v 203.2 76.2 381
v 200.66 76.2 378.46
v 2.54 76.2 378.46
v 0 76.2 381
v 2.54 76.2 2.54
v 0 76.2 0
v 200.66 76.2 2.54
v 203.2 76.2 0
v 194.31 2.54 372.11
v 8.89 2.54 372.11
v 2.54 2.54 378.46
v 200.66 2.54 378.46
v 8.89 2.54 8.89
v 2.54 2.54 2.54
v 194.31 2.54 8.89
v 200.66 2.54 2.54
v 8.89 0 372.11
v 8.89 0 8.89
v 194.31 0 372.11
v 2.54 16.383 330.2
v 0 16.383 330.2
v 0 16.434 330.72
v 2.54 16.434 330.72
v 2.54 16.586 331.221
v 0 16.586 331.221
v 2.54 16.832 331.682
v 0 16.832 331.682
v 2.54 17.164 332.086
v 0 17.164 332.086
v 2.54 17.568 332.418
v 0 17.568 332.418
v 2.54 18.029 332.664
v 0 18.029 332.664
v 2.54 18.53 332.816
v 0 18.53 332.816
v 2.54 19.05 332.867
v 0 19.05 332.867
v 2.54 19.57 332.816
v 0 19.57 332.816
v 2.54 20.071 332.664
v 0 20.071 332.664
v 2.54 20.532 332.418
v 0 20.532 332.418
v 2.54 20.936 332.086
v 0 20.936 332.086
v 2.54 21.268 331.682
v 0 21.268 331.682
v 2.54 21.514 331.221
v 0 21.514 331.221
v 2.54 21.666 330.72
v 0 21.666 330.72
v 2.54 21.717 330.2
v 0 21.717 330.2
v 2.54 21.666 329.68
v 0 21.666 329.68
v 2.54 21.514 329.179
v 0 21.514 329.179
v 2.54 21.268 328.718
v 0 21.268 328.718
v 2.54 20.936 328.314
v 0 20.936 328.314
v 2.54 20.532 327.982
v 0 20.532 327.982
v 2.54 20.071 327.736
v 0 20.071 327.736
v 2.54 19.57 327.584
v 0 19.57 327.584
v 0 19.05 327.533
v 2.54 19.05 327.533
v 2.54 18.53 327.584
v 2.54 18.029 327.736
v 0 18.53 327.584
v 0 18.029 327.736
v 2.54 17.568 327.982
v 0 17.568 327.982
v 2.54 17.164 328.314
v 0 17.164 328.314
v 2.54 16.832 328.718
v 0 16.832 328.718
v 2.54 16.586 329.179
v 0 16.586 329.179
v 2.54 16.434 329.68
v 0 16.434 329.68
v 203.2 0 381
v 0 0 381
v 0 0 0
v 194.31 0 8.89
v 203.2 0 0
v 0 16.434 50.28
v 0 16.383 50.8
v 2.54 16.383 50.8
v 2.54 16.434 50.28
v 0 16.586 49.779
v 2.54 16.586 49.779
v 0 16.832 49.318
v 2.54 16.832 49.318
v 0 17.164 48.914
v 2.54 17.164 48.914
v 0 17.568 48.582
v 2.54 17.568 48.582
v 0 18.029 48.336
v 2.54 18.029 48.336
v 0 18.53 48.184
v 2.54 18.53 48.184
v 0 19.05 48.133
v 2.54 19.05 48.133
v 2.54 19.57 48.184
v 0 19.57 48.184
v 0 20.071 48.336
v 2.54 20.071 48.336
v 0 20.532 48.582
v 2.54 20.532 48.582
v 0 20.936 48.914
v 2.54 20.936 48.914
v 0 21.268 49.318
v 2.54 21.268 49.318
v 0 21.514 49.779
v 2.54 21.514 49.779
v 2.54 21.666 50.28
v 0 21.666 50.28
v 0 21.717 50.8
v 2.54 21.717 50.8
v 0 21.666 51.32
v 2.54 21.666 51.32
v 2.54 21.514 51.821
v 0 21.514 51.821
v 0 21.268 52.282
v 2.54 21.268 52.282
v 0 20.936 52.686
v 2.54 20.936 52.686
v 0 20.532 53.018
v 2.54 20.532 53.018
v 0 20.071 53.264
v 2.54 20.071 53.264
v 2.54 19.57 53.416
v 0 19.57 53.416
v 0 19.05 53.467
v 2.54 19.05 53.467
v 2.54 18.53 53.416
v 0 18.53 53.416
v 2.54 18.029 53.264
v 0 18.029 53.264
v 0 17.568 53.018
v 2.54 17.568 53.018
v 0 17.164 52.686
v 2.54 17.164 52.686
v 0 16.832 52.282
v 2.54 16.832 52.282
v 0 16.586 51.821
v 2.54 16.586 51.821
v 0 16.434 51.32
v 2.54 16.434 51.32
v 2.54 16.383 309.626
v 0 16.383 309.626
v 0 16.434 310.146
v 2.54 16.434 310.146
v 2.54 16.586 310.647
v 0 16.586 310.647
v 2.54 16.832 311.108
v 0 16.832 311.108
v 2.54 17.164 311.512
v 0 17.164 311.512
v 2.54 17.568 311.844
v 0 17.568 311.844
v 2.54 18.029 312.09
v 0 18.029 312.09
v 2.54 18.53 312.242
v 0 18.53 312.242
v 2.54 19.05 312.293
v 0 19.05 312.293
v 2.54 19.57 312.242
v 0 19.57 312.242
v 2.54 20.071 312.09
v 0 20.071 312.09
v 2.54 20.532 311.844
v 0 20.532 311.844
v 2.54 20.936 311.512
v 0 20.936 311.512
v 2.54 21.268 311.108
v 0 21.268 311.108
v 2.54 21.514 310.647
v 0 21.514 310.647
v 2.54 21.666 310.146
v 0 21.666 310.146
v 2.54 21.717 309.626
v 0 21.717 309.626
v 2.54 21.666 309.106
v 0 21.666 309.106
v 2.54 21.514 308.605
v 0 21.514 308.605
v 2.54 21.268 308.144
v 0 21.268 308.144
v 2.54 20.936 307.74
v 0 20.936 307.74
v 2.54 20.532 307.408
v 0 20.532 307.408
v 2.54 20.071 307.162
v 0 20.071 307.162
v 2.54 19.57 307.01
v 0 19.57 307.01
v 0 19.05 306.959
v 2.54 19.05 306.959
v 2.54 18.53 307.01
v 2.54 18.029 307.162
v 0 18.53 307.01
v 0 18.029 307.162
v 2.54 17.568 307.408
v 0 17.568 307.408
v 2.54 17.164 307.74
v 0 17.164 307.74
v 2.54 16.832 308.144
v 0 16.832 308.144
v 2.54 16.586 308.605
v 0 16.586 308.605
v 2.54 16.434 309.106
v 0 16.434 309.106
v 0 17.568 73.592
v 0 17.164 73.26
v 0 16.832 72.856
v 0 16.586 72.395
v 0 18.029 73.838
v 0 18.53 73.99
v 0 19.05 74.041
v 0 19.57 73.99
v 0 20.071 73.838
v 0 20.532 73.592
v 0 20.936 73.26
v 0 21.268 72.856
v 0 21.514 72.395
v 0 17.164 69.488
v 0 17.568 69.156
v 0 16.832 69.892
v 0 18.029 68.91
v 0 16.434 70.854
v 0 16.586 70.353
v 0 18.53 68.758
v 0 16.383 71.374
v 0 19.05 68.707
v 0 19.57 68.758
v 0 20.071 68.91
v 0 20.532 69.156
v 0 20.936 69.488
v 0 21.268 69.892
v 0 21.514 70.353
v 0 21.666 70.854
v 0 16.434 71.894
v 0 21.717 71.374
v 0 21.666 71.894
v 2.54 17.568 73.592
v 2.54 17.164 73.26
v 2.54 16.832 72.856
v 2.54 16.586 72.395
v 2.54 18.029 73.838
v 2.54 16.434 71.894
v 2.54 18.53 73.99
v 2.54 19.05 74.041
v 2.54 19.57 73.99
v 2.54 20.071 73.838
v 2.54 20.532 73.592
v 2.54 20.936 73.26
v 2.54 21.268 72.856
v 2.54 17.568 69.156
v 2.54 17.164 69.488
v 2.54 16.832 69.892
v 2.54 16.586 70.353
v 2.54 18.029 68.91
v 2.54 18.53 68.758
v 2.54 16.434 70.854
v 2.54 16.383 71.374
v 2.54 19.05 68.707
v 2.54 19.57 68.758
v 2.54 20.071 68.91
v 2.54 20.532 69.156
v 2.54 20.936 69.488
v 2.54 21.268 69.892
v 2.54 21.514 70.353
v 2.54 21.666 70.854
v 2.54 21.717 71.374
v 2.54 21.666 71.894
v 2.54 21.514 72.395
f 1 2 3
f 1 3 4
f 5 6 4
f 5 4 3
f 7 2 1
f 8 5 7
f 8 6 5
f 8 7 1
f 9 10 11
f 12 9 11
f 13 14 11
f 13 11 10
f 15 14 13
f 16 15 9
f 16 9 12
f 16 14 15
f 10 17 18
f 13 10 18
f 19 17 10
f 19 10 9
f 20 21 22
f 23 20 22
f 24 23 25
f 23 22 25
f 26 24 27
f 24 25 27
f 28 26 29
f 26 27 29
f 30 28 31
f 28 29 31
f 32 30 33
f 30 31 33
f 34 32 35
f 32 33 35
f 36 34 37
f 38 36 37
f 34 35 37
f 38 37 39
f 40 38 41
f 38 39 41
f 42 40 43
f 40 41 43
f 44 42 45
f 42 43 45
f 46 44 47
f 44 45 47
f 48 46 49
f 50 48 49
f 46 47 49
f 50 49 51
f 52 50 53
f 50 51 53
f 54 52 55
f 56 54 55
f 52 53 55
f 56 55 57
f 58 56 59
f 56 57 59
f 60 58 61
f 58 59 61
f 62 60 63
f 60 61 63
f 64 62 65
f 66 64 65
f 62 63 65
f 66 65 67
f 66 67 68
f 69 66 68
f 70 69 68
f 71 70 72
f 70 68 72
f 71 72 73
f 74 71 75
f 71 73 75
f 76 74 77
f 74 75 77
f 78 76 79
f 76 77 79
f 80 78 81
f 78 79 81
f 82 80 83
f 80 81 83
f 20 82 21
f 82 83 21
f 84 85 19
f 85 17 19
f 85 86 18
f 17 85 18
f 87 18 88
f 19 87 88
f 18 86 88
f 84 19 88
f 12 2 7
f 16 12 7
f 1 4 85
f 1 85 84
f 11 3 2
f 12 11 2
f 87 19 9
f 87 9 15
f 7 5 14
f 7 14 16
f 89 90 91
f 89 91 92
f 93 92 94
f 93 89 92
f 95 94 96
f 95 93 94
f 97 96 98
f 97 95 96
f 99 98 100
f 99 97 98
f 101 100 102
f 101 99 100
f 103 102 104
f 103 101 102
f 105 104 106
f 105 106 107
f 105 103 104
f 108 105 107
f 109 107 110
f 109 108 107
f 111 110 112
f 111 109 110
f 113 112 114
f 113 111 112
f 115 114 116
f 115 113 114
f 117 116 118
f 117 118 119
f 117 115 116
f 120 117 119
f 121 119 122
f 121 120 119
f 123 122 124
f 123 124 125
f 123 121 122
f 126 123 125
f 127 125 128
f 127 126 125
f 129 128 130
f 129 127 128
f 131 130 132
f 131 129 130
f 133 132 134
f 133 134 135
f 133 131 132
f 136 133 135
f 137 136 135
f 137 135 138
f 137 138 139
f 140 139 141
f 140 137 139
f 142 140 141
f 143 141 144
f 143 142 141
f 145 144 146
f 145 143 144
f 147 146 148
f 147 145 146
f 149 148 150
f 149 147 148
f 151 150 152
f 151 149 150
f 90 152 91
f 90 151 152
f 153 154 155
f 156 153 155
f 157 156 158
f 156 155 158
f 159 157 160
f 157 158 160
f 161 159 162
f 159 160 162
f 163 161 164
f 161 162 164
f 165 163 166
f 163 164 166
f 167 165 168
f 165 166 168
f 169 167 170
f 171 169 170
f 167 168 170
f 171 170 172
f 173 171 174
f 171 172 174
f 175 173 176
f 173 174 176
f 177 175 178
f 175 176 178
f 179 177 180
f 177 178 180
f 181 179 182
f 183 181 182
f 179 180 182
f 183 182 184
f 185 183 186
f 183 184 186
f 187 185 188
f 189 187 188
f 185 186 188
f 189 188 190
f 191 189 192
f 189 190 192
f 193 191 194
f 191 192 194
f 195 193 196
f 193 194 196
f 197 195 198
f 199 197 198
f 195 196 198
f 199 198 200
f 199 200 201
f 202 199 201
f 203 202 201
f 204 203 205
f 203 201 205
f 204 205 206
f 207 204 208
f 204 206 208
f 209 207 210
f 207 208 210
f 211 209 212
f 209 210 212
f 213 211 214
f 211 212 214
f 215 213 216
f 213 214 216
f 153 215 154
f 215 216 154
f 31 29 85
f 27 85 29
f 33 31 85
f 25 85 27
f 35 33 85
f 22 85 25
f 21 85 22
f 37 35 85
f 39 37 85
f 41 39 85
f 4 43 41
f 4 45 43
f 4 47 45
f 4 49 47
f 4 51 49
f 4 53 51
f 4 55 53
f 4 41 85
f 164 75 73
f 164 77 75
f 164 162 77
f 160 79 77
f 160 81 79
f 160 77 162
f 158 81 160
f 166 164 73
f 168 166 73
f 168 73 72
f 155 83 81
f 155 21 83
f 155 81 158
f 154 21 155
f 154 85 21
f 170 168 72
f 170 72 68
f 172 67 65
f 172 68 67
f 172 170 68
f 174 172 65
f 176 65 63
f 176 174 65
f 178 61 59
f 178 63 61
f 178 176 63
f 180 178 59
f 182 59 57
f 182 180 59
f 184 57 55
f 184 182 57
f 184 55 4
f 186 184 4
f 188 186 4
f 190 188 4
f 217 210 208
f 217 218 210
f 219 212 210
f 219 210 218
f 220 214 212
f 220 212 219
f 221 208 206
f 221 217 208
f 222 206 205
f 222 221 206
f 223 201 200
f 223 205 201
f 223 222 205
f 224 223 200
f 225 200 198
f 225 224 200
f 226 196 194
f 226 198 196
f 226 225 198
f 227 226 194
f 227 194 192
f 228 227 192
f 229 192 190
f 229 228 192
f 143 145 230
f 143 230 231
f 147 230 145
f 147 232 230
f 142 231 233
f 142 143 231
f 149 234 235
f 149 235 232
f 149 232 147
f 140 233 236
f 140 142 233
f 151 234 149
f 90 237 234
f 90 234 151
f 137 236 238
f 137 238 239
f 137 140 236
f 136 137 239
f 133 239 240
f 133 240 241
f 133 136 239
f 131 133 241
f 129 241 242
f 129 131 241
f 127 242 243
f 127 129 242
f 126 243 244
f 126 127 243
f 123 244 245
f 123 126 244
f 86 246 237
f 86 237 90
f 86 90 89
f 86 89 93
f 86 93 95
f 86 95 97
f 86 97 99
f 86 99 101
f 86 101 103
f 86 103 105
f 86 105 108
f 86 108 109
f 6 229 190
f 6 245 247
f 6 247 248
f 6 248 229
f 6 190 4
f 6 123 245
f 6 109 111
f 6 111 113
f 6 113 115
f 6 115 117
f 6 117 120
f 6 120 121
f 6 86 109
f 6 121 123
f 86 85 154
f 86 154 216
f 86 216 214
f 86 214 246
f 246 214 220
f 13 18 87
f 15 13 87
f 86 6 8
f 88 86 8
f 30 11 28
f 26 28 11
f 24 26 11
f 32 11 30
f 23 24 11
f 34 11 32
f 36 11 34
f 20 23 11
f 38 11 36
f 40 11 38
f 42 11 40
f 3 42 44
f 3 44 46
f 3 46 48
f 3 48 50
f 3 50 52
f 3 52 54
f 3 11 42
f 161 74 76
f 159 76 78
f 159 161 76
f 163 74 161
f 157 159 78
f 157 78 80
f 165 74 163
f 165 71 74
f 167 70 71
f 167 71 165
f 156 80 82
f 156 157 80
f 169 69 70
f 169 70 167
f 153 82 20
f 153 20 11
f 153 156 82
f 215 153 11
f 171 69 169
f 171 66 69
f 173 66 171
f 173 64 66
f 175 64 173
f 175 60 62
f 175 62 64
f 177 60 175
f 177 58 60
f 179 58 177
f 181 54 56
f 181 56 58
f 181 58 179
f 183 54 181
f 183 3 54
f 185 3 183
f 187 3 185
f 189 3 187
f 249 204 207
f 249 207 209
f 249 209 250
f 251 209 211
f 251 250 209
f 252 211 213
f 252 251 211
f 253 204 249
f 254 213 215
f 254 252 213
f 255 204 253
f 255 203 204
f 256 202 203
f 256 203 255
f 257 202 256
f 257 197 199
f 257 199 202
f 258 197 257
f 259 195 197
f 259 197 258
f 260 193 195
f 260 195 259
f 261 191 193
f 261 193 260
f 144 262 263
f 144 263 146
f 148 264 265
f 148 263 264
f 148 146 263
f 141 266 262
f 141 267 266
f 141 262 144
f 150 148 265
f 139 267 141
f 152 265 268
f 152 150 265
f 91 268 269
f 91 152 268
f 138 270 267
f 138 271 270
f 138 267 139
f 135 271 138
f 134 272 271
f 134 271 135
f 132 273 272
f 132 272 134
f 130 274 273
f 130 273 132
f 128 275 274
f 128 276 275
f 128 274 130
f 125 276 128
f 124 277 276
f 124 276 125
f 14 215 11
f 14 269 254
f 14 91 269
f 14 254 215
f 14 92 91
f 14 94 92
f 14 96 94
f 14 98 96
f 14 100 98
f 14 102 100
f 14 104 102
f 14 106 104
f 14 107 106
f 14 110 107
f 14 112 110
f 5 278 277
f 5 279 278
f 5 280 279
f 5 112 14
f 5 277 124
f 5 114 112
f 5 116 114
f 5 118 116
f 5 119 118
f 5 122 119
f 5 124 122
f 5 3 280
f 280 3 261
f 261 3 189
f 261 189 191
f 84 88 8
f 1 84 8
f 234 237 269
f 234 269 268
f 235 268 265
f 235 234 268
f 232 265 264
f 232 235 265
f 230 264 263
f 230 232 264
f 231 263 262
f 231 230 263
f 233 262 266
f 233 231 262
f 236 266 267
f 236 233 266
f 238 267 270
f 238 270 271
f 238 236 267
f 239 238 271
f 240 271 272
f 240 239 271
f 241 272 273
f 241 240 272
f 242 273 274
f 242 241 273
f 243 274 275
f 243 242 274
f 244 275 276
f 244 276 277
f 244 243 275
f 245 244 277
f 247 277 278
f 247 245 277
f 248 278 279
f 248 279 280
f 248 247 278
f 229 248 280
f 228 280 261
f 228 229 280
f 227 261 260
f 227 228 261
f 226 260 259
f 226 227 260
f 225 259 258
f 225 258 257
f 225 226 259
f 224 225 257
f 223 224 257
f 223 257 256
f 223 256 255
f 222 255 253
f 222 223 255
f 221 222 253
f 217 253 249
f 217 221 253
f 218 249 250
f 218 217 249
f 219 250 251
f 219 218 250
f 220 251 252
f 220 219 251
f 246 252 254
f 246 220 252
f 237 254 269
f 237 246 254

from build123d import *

# Parameters (mm, degrees)
SKETCH2_W           = 203.2
SKETCH2_H           = 76.2
BOSS_EXTRUDE1_DEPTH = 381
SKETCH3_W           = 198.12
SKETCH3_H           = 375.92
CUT_EXTRUDE1_DEPTH  = 439.471983141
SKETCH4_W           = 198.12
SKETCH4_H           = 375.92
SKETCH4_W_2         = 185.42
SKETCH4_H_2         = 363.22
BOSS_EXTRUDE2_DEPTH = 2.54
SKETCH5_R           = 2.667
CUT_EXTRUDE2_DEPTH  = 2.54


with BuildPart() as part:
    # Sketch2 → Boss-Extrude1 (new body)
    with BuildSketch(Plane.XY):
        with Locations((101.6, 38.1)):
            Rectangle(SKETCH2_W, SKETCH2_H)
    extrude(amount=BOSS_EXTRUDE1_DEPTH)

    # Sketch3 → Cut-Extrude1 (cut, through all)
    with BuildSketch(Plane(origin=(0, 76.2, 0), x_dir=(1, 0, 0), z_dir=(0, 1, 0))):
        with Locations((101.6, -190.5)):
            Rectangle(SKETCH3_W, SKETCH3_H)
    extrude(amount=-CUT_EXTRUDE1_DEPTH, mode=Mode.SUBTRACT)

    # Sketch4 → Boss-Extrude2 (add)
    with BuildSketch(Plane(origin=(0, 0, 0), x_dir=(1, 0, 0), z_dir=(0, 1, 0))):
        with Locations((101.6, -190.5)):
            Rectangle(SKETCH4_W, SKETCH4_H)
        with Locations((101.6, -190.5)):
            Rectangle(SKETCH4_W_2, SKETCH4_H_2, mode=Mode.SUBTRACT)
    extrude(amount=BOSS_EXTRUDE2_DEPTH)

    # Sketch5 → Cut-Extrude2 (cut)
    with BuildSketch(Plane.ZY):
        with Locations(Location((309.626, 19.05, 0), (0, 0, 270))):
            Circle(SKETCH5_R)
        with Locations(Location((330.2, 19.05, 0), (0, 0, 270))):
            Circle(SKETCH5_R)
    cut_extrude2 = extrude(amount=-CUT_EXTRUDE2_DEPTH, mode=Mode.SUBTRACT)

    # Mirror1: Cut-Extrude2 across plane
    add(cut_extrude2.mirror(Plane(origin=(0, 0, 190.5), x_dir=(1, 0, 0), z_dir=(0, 0, -1))), mode=Mode.SUBTRACT)


solid = part.part
